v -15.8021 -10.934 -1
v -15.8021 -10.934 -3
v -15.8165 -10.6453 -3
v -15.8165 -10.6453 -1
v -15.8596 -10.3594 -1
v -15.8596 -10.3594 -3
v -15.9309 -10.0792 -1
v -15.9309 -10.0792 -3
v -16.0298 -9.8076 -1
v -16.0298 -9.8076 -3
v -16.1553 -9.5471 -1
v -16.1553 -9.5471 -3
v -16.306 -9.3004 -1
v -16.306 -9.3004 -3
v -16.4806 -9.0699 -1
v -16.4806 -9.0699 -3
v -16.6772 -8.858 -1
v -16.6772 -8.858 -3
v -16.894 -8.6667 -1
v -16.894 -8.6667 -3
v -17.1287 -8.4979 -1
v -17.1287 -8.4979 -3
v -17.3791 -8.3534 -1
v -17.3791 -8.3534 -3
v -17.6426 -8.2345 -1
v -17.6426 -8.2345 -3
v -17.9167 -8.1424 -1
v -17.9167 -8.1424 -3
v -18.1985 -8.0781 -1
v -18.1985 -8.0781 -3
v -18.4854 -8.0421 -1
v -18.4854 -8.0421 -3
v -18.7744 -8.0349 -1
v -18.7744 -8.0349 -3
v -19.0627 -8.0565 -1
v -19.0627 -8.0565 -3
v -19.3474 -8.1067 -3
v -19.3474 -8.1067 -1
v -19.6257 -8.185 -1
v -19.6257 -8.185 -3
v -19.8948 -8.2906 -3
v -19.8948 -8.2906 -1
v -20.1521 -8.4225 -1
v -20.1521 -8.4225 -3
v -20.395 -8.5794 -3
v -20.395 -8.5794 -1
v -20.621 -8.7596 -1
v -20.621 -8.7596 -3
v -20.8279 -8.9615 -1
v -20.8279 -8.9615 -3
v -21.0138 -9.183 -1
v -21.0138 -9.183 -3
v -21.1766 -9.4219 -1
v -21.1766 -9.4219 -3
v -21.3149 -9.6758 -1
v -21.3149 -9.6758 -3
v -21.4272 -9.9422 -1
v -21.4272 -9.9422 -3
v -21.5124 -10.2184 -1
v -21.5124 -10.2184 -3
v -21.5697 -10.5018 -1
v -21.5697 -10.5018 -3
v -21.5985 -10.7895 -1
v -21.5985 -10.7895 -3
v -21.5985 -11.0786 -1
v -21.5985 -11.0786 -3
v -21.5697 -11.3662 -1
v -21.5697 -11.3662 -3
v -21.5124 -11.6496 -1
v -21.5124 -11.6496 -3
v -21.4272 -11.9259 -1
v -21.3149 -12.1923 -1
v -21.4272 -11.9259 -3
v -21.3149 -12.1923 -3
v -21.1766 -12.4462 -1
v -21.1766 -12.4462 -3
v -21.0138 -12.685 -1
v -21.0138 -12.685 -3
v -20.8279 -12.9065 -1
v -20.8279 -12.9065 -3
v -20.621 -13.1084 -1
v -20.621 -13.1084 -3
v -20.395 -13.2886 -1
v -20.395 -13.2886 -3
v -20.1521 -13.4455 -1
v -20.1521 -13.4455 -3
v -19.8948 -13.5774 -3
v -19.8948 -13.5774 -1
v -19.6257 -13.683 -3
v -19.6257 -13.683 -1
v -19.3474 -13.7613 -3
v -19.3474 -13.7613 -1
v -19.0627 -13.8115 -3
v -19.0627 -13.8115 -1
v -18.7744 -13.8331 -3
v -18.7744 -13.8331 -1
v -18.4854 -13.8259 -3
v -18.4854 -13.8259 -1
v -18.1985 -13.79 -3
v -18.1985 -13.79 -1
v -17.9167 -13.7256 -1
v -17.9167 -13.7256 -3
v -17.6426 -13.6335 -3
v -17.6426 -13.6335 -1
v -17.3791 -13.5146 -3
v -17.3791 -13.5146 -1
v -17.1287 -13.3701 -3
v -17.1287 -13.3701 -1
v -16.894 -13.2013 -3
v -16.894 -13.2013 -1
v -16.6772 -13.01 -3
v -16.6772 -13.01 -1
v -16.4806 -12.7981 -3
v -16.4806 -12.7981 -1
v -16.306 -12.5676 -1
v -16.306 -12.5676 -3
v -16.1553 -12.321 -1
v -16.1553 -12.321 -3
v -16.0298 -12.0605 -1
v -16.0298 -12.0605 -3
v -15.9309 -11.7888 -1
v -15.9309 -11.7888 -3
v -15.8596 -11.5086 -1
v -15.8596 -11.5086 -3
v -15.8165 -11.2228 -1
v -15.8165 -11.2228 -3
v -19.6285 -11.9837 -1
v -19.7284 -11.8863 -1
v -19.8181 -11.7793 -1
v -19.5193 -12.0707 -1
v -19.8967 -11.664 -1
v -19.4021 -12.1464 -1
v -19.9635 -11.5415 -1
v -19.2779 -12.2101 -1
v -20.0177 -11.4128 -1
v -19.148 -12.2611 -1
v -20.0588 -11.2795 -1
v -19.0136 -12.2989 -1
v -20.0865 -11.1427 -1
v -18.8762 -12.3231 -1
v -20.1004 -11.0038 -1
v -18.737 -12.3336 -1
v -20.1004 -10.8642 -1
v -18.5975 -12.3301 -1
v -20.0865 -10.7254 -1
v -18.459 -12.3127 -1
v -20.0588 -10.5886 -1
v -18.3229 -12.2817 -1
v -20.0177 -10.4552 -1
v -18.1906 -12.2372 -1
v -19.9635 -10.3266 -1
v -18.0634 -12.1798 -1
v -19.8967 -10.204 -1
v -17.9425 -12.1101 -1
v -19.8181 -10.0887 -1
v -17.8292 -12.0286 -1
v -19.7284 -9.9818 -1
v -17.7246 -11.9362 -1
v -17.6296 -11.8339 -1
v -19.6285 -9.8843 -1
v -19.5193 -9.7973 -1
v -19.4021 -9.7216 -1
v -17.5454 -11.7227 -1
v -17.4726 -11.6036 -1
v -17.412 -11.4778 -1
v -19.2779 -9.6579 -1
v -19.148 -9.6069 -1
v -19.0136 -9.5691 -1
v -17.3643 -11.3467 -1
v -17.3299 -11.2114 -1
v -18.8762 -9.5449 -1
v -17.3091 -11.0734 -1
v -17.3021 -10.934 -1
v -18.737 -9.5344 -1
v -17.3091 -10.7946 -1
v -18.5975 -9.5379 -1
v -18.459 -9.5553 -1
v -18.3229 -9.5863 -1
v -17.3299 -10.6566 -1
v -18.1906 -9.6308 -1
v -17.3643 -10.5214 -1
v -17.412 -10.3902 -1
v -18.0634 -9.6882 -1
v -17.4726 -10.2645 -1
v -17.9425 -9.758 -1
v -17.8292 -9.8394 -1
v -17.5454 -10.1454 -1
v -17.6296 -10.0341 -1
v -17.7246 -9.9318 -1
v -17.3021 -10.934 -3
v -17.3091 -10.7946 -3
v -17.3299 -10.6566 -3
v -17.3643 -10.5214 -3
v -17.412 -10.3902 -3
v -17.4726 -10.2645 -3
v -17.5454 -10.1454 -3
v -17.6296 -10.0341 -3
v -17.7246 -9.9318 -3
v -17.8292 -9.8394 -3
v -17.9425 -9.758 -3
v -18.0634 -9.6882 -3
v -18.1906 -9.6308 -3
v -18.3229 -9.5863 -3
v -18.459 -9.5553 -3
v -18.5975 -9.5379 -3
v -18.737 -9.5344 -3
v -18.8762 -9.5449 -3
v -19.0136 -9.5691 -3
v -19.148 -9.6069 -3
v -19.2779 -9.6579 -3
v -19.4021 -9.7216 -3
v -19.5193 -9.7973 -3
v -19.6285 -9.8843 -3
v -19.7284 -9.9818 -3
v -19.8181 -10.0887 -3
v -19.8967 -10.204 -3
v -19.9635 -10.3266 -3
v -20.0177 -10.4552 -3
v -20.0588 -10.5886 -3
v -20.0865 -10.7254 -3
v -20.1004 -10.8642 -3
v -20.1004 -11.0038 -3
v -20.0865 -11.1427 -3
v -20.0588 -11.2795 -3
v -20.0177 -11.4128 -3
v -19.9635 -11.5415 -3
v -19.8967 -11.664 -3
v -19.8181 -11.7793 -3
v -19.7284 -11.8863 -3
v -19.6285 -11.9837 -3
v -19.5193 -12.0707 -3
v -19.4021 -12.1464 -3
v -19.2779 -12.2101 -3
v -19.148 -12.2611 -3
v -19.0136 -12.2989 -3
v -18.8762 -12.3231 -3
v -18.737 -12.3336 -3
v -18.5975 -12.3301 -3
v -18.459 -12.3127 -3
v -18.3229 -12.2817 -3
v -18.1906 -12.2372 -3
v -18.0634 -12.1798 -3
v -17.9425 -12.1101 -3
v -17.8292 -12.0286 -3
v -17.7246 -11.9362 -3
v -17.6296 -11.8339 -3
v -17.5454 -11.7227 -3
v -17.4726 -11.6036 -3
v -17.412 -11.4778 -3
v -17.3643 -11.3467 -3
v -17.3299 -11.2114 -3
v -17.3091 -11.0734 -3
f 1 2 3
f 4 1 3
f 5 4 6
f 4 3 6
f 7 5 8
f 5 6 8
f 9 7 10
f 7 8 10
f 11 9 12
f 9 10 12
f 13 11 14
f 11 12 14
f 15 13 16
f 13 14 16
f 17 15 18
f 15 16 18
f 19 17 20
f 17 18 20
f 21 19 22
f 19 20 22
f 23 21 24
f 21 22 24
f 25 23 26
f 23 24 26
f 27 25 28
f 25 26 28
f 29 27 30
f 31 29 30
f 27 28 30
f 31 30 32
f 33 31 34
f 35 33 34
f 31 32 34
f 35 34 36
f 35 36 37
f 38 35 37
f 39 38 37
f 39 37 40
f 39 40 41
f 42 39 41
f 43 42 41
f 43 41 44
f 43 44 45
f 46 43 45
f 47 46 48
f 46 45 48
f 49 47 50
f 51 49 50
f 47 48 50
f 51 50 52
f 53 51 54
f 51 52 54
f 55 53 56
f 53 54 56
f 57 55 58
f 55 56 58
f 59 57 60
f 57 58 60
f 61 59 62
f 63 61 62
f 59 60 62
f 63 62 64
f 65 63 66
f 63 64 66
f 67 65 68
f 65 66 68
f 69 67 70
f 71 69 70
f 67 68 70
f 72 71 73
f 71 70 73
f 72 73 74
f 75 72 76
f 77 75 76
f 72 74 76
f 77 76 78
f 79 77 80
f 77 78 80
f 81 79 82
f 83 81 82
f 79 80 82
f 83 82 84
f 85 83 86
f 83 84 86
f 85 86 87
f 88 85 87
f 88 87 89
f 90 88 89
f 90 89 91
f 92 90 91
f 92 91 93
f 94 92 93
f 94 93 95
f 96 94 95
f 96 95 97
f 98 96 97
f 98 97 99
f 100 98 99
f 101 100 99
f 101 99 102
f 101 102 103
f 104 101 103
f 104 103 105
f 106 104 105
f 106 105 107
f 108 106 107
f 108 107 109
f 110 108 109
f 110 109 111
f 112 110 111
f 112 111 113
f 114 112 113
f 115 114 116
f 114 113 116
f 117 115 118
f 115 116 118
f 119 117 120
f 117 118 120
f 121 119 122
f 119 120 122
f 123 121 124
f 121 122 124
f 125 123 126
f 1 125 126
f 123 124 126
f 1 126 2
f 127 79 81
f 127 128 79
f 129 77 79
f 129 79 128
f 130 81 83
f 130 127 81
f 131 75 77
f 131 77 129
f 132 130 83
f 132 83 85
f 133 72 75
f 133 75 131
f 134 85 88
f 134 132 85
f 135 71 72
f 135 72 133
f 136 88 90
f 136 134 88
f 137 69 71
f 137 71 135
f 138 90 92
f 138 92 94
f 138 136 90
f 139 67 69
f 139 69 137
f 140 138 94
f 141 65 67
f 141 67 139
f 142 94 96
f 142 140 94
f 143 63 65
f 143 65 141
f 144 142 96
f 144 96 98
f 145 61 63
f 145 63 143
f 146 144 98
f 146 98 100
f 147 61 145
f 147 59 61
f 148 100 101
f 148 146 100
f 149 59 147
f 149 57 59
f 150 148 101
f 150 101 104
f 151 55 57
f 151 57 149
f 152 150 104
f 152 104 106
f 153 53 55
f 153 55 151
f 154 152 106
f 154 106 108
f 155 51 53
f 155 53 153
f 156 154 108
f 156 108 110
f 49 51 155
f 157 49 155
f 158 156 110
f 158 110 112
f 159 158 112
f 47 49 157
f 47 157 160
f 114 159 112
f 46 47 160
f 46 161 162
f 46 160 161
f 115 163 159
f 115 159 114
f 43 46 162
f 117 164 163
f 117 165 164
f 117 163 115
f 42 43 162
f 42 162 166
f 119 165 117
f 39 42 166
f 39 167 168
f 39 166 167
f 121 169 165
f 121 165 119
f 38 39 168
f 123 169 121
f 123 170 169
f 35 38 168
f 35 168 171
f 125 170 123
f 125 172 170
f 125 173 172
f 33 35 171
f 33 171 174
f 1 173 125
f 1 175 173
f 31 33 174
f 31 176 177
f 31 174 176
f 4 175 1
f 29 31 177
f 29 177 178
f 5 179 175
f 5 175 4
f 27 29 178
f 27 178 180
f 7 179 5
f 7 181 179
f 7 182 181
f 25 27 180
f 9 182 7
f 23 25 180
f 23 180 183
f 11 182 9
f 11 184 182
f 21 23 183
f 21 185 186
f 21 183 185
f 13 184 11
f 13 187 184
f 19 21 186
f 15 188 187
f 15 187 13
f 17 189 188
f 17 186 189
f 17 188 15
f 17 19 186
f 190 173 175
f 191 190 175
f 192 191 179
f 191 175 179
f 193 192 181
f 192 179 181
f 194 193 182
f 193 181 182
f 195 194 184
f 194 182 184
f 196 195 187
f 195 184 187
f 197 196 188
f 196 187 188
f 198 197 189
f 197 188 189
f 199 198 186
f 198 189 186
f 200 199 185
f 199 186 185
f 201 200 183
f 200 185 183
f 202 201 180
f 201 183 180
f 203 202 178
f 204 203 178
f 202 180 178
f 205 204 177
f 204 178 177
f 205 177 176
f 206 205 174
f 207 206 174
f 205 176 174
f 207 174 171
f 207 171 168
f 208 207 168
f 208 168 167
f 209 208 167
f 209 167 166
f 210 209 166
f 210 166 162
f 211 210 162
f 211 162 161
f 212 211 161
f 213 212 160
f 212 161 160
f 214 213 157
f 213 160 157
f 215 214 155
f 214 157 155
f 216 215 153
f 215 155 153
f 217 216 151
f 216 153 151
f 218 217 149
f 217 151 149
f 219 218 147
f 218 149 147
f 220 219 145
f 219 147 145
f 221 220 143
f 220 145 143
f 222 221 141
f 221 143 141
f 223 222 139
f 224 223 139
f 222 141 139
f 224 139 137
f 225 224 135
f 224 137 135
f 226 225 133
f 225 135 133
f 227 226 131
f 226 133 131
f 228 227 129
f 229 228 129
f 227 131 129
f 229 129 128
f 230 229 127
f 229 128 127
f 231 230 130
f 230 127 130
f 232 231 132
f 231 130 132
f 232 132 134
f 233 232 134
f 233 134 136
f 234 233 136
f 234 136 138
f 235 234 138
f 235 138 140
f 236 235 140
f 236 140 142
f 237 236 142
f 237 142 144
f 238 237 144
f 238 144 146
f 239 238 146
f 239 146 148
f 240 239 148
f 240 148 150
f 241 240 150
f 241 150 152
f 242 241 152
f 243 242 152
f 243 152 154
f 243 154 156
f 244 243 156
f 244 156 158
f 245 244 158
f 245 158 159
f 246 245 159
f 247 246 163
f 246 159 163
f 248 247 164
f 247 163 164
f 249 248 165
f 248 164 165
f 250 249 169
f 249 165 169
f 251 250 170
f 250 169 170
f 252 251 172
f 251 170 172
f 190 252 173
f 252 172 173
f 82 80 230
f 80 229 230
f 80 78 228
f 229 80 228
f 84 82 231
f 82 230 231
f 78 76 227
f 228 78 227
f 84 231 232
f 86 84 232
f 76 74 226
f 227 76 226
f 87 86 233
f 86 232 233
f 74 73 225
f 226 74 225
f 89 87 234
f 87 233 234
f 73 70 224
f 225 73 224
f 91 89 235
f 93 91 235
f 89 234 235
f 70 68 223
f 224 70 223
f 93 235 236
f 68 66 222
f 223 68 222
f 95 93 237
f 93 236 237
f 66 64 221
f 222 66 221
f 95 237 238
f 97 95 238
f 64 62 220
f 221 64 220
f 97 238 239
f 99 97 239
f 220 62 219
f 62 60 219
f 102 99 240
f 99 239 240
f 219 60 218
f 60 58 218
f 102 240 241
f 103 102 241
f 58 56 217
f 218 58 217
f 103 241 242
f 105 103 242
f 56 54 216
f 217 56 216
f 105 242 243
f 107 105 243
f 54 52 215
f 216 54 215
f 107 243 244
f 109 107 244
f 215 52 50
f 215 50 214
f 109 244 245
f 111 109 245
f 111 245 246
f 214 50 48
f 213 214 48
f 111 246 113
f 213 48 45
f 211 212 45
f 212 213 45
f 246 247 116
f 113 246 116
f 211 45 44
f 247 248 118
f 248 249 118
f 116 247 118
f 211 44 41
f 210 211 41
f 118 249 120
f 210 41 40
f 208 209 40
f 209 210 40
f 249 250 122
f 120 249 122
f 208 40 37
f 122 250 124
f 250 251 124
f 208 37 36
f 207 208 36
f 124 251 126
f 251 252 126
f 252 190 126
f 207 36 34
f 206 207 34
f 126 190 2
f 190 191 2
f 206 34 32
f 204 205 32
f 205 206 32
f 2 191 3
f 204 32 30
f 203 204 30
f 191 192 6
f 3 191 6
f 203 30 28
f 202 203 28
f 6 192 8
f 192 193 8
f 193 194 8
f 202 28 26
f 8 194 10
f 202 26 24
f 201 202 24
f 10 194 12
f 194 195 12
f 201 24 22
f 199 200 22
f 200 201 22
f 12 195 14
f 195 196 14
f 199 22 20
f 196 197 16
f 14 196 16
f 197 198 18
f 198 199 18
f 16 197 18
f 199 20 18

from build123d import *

# Parameters (mm, degrees)
CIRCLE014_R      = 1.4
EXTRUDE175_DEPTH = 2
CIRCLE_R         = 2.9
EXTRUDE174_DEPTH = 2


with BuildPart() as extrude175:
    # Circle014 → Extrude175 (new body)
    with BuildSketch(Plane(origin=(-18.702098, -10.934014, -1), x_dir=(1, 0, 0), z_dir=(0, 0, 1))):
        Circle(CIRCLE014_R)
    extrude(amount=-EXTRUDE175_DEPTH)


with BuildPart() as cut087:
    # Circle → Extrude174 (new body)
    with BuildSketch(Plane(origin=(-18.702098, -10.934014, -3), x_dir=(1, 0, 0), z_dir=(0, 0, 1))):
        Circle(CIRCLE_R)
    extrude(amount=EXTRUDE174_DEPTH)

    # Cut087: cut Extrude175
    add(extrude175.part, mode=Mode.SUBTRACT)


solid = cut087.part
